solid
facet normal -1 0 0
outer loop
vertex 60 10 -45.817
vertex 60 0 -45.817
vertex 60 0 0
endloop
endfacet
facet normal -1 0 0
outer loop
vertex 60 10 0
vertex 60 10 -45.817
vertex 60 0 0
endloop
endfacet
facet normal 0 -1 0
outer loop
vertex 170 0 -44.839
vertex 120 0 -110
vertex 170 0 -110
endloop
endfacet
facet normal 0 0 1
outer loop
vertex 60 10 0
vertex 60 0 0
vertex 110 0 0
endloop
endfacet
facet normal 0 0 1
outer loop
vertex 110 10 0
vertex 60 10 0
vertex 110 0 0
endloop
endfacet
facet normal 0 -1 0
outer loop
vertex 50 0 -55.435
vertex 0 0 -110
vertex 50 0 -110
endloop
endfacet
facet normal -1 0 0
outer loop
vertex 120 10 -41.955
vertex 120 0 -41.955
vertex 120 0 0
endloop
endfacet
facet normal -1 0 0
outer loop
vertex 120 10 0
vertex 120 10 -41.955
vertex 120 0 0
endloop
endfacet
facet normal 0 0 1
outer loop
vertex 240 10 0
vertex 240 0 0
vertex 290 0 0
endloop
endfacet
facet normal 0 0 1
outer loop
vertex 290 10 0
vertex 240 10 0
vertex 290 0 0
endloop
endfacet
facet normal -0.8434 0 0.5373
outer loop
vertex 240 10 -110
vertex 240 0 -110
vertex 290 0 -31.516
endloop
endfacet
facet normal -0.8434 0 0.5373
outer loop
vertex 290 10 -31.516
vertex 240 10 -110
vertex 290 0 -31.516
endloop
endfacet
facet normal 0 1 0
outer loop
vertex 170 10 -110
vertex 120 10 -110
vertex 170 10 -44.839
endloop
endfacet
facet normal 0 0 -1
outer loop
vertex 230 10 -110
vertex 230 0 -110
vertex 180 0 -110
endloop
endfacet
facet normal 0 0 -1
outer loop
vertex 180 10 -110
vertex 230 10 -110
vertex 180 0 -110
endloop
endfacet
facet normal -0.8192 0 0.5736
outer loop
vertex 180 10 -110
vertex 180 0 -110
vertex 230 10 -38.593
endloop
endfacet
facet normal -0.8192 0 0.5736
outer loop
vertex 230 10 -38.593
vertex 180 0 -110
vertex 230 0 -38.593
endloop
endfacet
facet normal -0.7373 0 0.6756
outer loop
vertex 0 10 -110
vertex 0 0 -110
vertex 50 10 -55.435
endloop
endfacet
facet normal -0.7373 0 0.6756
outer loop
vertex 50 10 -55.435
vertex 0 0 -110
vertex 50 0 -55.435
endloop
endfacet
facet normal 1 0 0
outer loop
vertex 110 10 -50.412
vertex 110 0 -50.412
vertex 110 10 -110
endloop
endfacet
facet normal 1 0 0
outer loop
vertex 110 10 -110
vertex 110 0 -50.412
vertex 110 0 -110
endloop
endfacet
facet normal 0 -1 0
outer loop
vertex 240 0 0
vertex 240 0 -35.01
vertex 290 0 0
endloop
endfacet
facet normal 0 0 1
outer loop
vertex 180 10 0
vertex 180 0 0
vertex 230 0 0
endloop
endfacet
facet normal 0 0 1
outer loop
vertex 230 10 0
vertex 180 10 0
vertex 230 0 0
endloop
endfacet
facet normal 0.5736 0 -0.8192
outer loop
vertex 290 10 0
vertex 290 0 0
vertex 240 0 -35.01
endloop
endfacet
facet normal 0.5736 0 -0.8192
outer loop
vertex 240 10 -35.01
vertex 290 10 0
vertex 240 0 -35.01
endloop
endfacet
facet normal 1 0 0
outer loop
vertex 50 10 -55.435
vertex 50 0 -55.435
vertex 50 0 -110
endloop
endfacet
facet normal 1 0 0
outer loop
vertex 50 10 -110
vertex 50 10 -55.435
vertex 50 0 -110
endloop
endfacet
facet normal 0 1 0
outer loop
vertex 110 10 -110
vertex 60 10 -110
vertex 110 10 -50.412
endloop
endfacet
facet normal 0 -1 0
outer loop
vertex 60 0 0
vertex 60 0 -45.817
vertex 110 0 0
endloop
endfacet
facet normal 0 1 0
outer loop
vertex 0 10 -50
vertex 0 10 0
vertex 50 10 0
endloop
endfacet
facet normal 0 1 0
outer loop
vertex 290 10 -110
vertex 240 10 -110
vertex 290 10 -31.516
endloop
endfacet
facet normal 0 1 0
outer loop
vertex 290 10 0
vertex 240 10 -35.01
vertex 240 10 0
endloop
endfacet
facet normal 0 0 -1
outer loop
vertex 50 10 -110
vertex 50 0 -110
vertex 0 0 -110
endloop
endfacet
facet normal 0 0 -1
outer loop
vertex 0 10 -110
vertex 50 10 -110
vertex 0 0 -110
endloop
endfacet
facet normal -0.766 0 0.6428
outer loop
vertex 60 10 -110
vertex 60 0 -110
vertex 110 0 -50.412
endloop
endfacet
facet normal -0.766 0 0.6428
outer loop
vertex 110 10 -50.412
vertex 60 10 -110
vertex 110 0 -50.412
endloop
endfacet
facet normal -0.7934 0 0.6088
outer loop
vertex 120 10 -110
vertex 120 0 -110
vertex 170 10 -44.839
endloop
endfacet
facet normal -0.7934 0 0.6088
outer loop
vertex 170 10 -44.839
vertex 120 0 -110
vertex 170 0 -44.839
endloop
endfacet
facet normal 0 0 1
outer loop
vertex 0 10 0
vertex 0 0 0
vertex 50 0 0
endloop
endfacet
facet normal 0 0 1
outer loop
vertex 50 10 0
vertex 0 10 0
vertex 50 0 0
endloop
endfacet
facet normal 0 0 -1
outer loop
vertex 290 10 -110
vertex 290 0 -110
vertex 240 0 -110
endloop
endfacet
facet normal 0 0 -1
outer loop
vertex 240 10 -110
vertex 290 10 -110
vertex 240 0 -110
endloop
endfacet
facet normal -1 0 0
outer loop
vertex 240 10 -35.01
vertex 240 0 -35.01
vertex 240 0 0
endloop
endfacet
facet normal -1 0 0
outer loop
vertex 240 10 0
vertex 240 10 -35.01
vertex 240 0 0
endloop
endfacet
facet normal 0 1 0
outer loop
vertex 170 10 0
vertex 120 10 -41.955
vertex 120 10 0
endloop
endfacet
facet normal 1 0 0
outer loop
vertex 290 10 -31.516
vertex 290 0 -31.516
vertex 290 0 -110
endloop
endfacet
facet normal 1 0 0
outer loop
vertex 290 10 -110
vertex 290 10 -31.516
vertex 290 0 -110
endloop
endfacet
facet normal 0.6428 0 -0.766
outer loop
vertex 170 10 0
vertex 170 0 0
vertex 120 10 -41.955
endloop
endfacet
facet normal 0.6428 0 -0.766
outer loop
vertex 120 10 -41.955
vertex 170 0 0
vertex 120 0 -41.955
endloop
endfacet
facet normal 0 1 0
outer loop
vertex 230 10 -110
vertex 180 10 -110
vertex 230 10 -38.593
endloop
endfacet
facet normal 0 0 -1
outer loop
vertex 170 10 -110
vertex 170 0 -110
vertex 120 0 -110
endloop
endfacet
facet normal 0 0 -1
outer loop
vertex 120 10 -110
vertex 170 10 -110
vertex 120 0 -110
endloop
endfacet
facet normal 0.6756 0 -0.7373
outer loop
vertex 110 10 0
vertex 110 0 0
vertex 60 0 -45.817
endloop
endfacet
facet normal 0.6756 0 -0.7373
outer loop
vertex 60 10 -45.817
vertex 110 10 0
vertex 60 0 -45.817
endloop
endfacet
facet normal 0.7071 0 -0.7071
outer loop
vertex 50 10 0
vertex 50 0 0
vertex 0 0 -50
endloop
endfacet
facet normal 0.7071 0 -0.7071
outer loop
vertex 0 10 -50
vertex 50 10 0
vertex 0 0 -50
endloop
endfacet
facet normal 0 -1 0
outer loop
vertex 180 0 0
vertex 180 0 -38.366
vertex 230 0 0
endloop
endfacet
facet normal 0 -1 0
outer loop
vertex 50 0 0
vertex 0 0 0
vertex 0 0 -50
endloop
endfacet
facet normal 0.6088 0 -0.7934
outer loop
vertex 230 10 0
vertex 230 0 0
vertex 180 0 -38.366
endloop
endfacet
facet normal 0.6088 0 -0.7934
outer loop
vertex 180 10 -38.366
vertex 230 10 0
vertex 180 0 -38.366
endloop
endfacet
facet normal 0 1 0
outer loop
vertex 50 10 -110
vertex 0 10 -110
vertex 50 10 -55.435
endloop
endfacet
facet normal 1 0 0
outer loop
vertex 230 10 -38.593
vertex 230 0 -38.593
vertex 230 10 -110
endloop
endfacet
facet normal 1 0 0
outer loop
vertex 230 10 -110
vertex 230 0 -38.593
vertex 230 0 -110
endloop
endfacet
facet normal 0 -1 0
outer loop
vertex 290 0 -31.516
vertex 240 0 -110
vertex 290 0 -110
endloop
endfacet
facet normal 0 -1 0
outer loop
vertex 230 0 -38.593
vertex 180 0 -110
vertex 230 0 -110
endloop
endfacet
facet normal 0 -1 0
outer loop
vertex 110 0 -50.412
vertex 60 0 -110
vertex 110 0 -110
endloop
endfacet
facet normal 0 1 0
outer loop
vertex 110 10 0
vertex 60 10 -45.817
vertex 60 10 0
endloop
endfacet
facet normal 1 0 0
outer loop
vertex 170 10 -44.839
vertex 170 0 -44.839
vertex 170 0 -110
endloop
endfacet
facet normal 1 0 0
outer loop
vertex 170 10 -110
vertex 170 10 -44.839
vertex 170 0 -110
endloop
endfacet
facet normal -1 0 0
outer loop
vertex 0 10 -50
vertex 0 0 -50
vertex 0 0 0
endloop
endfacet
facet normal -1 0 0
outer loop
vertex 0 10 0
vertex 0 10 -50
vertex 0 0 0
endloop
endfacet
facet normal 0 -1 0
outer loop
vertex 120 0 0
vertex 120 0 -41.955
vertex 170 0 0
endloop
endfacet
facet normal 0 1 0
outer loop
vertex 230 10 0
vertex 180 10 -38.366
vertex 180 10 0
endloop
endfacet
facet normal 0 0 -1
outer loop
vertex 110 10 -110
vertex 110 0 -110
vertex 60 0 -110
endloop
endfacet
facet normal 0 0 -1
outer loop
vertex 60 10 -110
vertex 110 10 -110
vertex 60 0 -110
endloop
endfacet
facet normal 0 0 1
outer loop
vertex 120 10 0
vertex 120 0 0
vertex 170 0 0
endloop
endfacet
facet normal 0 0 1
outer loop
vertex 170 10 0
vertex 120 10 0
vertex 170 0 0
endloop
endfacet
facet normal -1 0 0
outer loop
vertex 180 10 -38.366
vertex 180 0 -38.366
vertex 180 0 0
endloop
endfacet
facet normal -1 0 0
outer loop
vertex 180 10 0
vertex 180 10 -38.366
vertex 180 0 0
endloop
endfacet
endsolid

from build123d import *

# Parameters (mm, degrees)
BOSS_EXTRUDE1_DEPTH    = 10
BOSS_EXTRUDE1_2_DEPTH  = 10
BOSS_EXTRUDE1_3_DEPTH  = 10
BOSS_EXTRUDE1_4_DEPTH  = 10
BOSS_EXTRUDE1_5_DEPTH  = 10
BOSS_EXTRUDE1_6_DEPTH  = 10
BOSS_EXTRUDE1_7_DEPTH  = 10
BOSS_EXTRUDE1_8_DEPTH  = 10
BOSS_EXTRUDE1_9_DEPTH  = 10
BOSS_EXTRUDE1_10_DEPTH = 10


with BuildPart() as part:
    # Sketch1 → Boss-Extrude1 (new body)
    with BuildSketch(Plane(origin=(0, 0, 0), x_dir=(1, 0, 0), z_dir=(0, 1, 0))):
        Polygon((50, 55.434574947), (50, 110), (0, 110), align=None)
    extrude(amount=BOSS_EXTRUDE1_DEPTH)


with BuildPart() as body_2:
    # Sketch1 → Boss-Extrude1 2 (new body)
    with BuildSketch(Plane(origin=(0, 0, 0), x_dir=(1, 0, 0), z_dir=(0, 1, 0))):
        Polygon((110, 50.41232037), (110, 110), (60, 110), align=None)
    extrude(amount=BOSS_EXTRUDE1_2_DEPTH)


with BuildPart() as body_3:
    # Sketch1 → Boss-Extrude1 3 (new body)
    with BuildSketch(Plane(origin=(0, 0, 0), x_dir=(1, 0, 0), z_dir=(0, 1, 0))):
        Polygon((170, 110), (120, 110), (170, 44.838731358), align=None)
    extrude(amount=BOSS_EXTRUDE1_3_DEPTH)


with BuildPart() as body_4:
    # Sketch1 → Boss-Extrude1 4 (new body)
    with BuildSketch(Plane(origin=(0, 0, 0), x_dir=(1, 0, 0), z_dir=(0, 1, 0))):
        Polygon((230, 38.592599663), (230, 110), (180, 110), align=None)
    extrude(amount=BOSS_EXTRUDE1_4_DEPTH)


with BuildPart() as body_5:
    # Sketch1 → Boss-Extrude1 5 (new body)
    with BuildSketch(Plane(origin=(0, 0, 0), x_dir=(1, 0, 0), z_dir=(0, 1, 0))):
        Polygon((290, 31.515721144), (290, 110), (240, 110), align=None)
    extrude(amount=BOSS_EXTRUDE1_5_DEPTH)


with BuildPart() as body_6:
    # Sketch1 → Boss-Extrude1 6 (new body)
    with BuildSketch(Plane(origin=(0, 0, 0), x_dir=(1, 0, 0), z_dir=(0, 1, 0))):
        Polygon((290, 0), (240, 35.01037691), (240, 0), align=None)
    extrude(amount=BOSS_EXTRUDE1_6_DEPTH)


with BuildPart() as body_7:
    # Sketch1 → Boss-Extrude1 7 (new body)
    with BuildSketch(Plane(origin=(0, 0, 0), x_dir=(1, 0, 0), z_dir=(0, 1, 0))):
        Polygon((230, 0), (180, 38.366349399), (180, 0), align=None)
    extrude(amount=BOSS_EXTRUDE1_7_DEPTH)


with BuildPart() as body_8:
    # Sketch1 → Boss-Extrude1 8 (new body)
    with BuildSketch(Plane(origin=(0, 0, 0), x_dir=(1, 0, 0), z_dir=(0, 1, 0))):
        Polygon((170, 0), (120, 41.954981559), (120, 0), align=None)
    extrude(amount=BOSS_EXTRUDE1_8_DEPTH)


with BuildPart() as body_9:
    # Sketch1 → Boss-Extrude1 9 (new body)
    with BuildSketch(Plane(origin=(0, 0, 0), x_dir=(1, 0, 0), z_dir=(0, 1, 0))):
        Polygon((110, 0), (60, 45.816558701), (60, 0), align=None)
    extrude(amount=BOSS_EXTRUDE1_9_DEPTH)


with BuildPart() as body_10:
    # Sketch1 → Boss-Extrude1 10 (new body)
    with BuildSketch(Plane(origin=(0, 0, 0), x_dir=(1, 0, 0), z_dir=(0, 1, 0))):
        Polygon((50, 0), (0, 50), (0, 0), align=None)
    extrude(amount=BOSS_EXTRUDE1_10_DEPTH)


solid = Compound([part.part, body_2.part, body_3.part, body_4.part, body_5.part, body_6.part, body_7.part, body_8.part, body_9.part, body_10.part])
